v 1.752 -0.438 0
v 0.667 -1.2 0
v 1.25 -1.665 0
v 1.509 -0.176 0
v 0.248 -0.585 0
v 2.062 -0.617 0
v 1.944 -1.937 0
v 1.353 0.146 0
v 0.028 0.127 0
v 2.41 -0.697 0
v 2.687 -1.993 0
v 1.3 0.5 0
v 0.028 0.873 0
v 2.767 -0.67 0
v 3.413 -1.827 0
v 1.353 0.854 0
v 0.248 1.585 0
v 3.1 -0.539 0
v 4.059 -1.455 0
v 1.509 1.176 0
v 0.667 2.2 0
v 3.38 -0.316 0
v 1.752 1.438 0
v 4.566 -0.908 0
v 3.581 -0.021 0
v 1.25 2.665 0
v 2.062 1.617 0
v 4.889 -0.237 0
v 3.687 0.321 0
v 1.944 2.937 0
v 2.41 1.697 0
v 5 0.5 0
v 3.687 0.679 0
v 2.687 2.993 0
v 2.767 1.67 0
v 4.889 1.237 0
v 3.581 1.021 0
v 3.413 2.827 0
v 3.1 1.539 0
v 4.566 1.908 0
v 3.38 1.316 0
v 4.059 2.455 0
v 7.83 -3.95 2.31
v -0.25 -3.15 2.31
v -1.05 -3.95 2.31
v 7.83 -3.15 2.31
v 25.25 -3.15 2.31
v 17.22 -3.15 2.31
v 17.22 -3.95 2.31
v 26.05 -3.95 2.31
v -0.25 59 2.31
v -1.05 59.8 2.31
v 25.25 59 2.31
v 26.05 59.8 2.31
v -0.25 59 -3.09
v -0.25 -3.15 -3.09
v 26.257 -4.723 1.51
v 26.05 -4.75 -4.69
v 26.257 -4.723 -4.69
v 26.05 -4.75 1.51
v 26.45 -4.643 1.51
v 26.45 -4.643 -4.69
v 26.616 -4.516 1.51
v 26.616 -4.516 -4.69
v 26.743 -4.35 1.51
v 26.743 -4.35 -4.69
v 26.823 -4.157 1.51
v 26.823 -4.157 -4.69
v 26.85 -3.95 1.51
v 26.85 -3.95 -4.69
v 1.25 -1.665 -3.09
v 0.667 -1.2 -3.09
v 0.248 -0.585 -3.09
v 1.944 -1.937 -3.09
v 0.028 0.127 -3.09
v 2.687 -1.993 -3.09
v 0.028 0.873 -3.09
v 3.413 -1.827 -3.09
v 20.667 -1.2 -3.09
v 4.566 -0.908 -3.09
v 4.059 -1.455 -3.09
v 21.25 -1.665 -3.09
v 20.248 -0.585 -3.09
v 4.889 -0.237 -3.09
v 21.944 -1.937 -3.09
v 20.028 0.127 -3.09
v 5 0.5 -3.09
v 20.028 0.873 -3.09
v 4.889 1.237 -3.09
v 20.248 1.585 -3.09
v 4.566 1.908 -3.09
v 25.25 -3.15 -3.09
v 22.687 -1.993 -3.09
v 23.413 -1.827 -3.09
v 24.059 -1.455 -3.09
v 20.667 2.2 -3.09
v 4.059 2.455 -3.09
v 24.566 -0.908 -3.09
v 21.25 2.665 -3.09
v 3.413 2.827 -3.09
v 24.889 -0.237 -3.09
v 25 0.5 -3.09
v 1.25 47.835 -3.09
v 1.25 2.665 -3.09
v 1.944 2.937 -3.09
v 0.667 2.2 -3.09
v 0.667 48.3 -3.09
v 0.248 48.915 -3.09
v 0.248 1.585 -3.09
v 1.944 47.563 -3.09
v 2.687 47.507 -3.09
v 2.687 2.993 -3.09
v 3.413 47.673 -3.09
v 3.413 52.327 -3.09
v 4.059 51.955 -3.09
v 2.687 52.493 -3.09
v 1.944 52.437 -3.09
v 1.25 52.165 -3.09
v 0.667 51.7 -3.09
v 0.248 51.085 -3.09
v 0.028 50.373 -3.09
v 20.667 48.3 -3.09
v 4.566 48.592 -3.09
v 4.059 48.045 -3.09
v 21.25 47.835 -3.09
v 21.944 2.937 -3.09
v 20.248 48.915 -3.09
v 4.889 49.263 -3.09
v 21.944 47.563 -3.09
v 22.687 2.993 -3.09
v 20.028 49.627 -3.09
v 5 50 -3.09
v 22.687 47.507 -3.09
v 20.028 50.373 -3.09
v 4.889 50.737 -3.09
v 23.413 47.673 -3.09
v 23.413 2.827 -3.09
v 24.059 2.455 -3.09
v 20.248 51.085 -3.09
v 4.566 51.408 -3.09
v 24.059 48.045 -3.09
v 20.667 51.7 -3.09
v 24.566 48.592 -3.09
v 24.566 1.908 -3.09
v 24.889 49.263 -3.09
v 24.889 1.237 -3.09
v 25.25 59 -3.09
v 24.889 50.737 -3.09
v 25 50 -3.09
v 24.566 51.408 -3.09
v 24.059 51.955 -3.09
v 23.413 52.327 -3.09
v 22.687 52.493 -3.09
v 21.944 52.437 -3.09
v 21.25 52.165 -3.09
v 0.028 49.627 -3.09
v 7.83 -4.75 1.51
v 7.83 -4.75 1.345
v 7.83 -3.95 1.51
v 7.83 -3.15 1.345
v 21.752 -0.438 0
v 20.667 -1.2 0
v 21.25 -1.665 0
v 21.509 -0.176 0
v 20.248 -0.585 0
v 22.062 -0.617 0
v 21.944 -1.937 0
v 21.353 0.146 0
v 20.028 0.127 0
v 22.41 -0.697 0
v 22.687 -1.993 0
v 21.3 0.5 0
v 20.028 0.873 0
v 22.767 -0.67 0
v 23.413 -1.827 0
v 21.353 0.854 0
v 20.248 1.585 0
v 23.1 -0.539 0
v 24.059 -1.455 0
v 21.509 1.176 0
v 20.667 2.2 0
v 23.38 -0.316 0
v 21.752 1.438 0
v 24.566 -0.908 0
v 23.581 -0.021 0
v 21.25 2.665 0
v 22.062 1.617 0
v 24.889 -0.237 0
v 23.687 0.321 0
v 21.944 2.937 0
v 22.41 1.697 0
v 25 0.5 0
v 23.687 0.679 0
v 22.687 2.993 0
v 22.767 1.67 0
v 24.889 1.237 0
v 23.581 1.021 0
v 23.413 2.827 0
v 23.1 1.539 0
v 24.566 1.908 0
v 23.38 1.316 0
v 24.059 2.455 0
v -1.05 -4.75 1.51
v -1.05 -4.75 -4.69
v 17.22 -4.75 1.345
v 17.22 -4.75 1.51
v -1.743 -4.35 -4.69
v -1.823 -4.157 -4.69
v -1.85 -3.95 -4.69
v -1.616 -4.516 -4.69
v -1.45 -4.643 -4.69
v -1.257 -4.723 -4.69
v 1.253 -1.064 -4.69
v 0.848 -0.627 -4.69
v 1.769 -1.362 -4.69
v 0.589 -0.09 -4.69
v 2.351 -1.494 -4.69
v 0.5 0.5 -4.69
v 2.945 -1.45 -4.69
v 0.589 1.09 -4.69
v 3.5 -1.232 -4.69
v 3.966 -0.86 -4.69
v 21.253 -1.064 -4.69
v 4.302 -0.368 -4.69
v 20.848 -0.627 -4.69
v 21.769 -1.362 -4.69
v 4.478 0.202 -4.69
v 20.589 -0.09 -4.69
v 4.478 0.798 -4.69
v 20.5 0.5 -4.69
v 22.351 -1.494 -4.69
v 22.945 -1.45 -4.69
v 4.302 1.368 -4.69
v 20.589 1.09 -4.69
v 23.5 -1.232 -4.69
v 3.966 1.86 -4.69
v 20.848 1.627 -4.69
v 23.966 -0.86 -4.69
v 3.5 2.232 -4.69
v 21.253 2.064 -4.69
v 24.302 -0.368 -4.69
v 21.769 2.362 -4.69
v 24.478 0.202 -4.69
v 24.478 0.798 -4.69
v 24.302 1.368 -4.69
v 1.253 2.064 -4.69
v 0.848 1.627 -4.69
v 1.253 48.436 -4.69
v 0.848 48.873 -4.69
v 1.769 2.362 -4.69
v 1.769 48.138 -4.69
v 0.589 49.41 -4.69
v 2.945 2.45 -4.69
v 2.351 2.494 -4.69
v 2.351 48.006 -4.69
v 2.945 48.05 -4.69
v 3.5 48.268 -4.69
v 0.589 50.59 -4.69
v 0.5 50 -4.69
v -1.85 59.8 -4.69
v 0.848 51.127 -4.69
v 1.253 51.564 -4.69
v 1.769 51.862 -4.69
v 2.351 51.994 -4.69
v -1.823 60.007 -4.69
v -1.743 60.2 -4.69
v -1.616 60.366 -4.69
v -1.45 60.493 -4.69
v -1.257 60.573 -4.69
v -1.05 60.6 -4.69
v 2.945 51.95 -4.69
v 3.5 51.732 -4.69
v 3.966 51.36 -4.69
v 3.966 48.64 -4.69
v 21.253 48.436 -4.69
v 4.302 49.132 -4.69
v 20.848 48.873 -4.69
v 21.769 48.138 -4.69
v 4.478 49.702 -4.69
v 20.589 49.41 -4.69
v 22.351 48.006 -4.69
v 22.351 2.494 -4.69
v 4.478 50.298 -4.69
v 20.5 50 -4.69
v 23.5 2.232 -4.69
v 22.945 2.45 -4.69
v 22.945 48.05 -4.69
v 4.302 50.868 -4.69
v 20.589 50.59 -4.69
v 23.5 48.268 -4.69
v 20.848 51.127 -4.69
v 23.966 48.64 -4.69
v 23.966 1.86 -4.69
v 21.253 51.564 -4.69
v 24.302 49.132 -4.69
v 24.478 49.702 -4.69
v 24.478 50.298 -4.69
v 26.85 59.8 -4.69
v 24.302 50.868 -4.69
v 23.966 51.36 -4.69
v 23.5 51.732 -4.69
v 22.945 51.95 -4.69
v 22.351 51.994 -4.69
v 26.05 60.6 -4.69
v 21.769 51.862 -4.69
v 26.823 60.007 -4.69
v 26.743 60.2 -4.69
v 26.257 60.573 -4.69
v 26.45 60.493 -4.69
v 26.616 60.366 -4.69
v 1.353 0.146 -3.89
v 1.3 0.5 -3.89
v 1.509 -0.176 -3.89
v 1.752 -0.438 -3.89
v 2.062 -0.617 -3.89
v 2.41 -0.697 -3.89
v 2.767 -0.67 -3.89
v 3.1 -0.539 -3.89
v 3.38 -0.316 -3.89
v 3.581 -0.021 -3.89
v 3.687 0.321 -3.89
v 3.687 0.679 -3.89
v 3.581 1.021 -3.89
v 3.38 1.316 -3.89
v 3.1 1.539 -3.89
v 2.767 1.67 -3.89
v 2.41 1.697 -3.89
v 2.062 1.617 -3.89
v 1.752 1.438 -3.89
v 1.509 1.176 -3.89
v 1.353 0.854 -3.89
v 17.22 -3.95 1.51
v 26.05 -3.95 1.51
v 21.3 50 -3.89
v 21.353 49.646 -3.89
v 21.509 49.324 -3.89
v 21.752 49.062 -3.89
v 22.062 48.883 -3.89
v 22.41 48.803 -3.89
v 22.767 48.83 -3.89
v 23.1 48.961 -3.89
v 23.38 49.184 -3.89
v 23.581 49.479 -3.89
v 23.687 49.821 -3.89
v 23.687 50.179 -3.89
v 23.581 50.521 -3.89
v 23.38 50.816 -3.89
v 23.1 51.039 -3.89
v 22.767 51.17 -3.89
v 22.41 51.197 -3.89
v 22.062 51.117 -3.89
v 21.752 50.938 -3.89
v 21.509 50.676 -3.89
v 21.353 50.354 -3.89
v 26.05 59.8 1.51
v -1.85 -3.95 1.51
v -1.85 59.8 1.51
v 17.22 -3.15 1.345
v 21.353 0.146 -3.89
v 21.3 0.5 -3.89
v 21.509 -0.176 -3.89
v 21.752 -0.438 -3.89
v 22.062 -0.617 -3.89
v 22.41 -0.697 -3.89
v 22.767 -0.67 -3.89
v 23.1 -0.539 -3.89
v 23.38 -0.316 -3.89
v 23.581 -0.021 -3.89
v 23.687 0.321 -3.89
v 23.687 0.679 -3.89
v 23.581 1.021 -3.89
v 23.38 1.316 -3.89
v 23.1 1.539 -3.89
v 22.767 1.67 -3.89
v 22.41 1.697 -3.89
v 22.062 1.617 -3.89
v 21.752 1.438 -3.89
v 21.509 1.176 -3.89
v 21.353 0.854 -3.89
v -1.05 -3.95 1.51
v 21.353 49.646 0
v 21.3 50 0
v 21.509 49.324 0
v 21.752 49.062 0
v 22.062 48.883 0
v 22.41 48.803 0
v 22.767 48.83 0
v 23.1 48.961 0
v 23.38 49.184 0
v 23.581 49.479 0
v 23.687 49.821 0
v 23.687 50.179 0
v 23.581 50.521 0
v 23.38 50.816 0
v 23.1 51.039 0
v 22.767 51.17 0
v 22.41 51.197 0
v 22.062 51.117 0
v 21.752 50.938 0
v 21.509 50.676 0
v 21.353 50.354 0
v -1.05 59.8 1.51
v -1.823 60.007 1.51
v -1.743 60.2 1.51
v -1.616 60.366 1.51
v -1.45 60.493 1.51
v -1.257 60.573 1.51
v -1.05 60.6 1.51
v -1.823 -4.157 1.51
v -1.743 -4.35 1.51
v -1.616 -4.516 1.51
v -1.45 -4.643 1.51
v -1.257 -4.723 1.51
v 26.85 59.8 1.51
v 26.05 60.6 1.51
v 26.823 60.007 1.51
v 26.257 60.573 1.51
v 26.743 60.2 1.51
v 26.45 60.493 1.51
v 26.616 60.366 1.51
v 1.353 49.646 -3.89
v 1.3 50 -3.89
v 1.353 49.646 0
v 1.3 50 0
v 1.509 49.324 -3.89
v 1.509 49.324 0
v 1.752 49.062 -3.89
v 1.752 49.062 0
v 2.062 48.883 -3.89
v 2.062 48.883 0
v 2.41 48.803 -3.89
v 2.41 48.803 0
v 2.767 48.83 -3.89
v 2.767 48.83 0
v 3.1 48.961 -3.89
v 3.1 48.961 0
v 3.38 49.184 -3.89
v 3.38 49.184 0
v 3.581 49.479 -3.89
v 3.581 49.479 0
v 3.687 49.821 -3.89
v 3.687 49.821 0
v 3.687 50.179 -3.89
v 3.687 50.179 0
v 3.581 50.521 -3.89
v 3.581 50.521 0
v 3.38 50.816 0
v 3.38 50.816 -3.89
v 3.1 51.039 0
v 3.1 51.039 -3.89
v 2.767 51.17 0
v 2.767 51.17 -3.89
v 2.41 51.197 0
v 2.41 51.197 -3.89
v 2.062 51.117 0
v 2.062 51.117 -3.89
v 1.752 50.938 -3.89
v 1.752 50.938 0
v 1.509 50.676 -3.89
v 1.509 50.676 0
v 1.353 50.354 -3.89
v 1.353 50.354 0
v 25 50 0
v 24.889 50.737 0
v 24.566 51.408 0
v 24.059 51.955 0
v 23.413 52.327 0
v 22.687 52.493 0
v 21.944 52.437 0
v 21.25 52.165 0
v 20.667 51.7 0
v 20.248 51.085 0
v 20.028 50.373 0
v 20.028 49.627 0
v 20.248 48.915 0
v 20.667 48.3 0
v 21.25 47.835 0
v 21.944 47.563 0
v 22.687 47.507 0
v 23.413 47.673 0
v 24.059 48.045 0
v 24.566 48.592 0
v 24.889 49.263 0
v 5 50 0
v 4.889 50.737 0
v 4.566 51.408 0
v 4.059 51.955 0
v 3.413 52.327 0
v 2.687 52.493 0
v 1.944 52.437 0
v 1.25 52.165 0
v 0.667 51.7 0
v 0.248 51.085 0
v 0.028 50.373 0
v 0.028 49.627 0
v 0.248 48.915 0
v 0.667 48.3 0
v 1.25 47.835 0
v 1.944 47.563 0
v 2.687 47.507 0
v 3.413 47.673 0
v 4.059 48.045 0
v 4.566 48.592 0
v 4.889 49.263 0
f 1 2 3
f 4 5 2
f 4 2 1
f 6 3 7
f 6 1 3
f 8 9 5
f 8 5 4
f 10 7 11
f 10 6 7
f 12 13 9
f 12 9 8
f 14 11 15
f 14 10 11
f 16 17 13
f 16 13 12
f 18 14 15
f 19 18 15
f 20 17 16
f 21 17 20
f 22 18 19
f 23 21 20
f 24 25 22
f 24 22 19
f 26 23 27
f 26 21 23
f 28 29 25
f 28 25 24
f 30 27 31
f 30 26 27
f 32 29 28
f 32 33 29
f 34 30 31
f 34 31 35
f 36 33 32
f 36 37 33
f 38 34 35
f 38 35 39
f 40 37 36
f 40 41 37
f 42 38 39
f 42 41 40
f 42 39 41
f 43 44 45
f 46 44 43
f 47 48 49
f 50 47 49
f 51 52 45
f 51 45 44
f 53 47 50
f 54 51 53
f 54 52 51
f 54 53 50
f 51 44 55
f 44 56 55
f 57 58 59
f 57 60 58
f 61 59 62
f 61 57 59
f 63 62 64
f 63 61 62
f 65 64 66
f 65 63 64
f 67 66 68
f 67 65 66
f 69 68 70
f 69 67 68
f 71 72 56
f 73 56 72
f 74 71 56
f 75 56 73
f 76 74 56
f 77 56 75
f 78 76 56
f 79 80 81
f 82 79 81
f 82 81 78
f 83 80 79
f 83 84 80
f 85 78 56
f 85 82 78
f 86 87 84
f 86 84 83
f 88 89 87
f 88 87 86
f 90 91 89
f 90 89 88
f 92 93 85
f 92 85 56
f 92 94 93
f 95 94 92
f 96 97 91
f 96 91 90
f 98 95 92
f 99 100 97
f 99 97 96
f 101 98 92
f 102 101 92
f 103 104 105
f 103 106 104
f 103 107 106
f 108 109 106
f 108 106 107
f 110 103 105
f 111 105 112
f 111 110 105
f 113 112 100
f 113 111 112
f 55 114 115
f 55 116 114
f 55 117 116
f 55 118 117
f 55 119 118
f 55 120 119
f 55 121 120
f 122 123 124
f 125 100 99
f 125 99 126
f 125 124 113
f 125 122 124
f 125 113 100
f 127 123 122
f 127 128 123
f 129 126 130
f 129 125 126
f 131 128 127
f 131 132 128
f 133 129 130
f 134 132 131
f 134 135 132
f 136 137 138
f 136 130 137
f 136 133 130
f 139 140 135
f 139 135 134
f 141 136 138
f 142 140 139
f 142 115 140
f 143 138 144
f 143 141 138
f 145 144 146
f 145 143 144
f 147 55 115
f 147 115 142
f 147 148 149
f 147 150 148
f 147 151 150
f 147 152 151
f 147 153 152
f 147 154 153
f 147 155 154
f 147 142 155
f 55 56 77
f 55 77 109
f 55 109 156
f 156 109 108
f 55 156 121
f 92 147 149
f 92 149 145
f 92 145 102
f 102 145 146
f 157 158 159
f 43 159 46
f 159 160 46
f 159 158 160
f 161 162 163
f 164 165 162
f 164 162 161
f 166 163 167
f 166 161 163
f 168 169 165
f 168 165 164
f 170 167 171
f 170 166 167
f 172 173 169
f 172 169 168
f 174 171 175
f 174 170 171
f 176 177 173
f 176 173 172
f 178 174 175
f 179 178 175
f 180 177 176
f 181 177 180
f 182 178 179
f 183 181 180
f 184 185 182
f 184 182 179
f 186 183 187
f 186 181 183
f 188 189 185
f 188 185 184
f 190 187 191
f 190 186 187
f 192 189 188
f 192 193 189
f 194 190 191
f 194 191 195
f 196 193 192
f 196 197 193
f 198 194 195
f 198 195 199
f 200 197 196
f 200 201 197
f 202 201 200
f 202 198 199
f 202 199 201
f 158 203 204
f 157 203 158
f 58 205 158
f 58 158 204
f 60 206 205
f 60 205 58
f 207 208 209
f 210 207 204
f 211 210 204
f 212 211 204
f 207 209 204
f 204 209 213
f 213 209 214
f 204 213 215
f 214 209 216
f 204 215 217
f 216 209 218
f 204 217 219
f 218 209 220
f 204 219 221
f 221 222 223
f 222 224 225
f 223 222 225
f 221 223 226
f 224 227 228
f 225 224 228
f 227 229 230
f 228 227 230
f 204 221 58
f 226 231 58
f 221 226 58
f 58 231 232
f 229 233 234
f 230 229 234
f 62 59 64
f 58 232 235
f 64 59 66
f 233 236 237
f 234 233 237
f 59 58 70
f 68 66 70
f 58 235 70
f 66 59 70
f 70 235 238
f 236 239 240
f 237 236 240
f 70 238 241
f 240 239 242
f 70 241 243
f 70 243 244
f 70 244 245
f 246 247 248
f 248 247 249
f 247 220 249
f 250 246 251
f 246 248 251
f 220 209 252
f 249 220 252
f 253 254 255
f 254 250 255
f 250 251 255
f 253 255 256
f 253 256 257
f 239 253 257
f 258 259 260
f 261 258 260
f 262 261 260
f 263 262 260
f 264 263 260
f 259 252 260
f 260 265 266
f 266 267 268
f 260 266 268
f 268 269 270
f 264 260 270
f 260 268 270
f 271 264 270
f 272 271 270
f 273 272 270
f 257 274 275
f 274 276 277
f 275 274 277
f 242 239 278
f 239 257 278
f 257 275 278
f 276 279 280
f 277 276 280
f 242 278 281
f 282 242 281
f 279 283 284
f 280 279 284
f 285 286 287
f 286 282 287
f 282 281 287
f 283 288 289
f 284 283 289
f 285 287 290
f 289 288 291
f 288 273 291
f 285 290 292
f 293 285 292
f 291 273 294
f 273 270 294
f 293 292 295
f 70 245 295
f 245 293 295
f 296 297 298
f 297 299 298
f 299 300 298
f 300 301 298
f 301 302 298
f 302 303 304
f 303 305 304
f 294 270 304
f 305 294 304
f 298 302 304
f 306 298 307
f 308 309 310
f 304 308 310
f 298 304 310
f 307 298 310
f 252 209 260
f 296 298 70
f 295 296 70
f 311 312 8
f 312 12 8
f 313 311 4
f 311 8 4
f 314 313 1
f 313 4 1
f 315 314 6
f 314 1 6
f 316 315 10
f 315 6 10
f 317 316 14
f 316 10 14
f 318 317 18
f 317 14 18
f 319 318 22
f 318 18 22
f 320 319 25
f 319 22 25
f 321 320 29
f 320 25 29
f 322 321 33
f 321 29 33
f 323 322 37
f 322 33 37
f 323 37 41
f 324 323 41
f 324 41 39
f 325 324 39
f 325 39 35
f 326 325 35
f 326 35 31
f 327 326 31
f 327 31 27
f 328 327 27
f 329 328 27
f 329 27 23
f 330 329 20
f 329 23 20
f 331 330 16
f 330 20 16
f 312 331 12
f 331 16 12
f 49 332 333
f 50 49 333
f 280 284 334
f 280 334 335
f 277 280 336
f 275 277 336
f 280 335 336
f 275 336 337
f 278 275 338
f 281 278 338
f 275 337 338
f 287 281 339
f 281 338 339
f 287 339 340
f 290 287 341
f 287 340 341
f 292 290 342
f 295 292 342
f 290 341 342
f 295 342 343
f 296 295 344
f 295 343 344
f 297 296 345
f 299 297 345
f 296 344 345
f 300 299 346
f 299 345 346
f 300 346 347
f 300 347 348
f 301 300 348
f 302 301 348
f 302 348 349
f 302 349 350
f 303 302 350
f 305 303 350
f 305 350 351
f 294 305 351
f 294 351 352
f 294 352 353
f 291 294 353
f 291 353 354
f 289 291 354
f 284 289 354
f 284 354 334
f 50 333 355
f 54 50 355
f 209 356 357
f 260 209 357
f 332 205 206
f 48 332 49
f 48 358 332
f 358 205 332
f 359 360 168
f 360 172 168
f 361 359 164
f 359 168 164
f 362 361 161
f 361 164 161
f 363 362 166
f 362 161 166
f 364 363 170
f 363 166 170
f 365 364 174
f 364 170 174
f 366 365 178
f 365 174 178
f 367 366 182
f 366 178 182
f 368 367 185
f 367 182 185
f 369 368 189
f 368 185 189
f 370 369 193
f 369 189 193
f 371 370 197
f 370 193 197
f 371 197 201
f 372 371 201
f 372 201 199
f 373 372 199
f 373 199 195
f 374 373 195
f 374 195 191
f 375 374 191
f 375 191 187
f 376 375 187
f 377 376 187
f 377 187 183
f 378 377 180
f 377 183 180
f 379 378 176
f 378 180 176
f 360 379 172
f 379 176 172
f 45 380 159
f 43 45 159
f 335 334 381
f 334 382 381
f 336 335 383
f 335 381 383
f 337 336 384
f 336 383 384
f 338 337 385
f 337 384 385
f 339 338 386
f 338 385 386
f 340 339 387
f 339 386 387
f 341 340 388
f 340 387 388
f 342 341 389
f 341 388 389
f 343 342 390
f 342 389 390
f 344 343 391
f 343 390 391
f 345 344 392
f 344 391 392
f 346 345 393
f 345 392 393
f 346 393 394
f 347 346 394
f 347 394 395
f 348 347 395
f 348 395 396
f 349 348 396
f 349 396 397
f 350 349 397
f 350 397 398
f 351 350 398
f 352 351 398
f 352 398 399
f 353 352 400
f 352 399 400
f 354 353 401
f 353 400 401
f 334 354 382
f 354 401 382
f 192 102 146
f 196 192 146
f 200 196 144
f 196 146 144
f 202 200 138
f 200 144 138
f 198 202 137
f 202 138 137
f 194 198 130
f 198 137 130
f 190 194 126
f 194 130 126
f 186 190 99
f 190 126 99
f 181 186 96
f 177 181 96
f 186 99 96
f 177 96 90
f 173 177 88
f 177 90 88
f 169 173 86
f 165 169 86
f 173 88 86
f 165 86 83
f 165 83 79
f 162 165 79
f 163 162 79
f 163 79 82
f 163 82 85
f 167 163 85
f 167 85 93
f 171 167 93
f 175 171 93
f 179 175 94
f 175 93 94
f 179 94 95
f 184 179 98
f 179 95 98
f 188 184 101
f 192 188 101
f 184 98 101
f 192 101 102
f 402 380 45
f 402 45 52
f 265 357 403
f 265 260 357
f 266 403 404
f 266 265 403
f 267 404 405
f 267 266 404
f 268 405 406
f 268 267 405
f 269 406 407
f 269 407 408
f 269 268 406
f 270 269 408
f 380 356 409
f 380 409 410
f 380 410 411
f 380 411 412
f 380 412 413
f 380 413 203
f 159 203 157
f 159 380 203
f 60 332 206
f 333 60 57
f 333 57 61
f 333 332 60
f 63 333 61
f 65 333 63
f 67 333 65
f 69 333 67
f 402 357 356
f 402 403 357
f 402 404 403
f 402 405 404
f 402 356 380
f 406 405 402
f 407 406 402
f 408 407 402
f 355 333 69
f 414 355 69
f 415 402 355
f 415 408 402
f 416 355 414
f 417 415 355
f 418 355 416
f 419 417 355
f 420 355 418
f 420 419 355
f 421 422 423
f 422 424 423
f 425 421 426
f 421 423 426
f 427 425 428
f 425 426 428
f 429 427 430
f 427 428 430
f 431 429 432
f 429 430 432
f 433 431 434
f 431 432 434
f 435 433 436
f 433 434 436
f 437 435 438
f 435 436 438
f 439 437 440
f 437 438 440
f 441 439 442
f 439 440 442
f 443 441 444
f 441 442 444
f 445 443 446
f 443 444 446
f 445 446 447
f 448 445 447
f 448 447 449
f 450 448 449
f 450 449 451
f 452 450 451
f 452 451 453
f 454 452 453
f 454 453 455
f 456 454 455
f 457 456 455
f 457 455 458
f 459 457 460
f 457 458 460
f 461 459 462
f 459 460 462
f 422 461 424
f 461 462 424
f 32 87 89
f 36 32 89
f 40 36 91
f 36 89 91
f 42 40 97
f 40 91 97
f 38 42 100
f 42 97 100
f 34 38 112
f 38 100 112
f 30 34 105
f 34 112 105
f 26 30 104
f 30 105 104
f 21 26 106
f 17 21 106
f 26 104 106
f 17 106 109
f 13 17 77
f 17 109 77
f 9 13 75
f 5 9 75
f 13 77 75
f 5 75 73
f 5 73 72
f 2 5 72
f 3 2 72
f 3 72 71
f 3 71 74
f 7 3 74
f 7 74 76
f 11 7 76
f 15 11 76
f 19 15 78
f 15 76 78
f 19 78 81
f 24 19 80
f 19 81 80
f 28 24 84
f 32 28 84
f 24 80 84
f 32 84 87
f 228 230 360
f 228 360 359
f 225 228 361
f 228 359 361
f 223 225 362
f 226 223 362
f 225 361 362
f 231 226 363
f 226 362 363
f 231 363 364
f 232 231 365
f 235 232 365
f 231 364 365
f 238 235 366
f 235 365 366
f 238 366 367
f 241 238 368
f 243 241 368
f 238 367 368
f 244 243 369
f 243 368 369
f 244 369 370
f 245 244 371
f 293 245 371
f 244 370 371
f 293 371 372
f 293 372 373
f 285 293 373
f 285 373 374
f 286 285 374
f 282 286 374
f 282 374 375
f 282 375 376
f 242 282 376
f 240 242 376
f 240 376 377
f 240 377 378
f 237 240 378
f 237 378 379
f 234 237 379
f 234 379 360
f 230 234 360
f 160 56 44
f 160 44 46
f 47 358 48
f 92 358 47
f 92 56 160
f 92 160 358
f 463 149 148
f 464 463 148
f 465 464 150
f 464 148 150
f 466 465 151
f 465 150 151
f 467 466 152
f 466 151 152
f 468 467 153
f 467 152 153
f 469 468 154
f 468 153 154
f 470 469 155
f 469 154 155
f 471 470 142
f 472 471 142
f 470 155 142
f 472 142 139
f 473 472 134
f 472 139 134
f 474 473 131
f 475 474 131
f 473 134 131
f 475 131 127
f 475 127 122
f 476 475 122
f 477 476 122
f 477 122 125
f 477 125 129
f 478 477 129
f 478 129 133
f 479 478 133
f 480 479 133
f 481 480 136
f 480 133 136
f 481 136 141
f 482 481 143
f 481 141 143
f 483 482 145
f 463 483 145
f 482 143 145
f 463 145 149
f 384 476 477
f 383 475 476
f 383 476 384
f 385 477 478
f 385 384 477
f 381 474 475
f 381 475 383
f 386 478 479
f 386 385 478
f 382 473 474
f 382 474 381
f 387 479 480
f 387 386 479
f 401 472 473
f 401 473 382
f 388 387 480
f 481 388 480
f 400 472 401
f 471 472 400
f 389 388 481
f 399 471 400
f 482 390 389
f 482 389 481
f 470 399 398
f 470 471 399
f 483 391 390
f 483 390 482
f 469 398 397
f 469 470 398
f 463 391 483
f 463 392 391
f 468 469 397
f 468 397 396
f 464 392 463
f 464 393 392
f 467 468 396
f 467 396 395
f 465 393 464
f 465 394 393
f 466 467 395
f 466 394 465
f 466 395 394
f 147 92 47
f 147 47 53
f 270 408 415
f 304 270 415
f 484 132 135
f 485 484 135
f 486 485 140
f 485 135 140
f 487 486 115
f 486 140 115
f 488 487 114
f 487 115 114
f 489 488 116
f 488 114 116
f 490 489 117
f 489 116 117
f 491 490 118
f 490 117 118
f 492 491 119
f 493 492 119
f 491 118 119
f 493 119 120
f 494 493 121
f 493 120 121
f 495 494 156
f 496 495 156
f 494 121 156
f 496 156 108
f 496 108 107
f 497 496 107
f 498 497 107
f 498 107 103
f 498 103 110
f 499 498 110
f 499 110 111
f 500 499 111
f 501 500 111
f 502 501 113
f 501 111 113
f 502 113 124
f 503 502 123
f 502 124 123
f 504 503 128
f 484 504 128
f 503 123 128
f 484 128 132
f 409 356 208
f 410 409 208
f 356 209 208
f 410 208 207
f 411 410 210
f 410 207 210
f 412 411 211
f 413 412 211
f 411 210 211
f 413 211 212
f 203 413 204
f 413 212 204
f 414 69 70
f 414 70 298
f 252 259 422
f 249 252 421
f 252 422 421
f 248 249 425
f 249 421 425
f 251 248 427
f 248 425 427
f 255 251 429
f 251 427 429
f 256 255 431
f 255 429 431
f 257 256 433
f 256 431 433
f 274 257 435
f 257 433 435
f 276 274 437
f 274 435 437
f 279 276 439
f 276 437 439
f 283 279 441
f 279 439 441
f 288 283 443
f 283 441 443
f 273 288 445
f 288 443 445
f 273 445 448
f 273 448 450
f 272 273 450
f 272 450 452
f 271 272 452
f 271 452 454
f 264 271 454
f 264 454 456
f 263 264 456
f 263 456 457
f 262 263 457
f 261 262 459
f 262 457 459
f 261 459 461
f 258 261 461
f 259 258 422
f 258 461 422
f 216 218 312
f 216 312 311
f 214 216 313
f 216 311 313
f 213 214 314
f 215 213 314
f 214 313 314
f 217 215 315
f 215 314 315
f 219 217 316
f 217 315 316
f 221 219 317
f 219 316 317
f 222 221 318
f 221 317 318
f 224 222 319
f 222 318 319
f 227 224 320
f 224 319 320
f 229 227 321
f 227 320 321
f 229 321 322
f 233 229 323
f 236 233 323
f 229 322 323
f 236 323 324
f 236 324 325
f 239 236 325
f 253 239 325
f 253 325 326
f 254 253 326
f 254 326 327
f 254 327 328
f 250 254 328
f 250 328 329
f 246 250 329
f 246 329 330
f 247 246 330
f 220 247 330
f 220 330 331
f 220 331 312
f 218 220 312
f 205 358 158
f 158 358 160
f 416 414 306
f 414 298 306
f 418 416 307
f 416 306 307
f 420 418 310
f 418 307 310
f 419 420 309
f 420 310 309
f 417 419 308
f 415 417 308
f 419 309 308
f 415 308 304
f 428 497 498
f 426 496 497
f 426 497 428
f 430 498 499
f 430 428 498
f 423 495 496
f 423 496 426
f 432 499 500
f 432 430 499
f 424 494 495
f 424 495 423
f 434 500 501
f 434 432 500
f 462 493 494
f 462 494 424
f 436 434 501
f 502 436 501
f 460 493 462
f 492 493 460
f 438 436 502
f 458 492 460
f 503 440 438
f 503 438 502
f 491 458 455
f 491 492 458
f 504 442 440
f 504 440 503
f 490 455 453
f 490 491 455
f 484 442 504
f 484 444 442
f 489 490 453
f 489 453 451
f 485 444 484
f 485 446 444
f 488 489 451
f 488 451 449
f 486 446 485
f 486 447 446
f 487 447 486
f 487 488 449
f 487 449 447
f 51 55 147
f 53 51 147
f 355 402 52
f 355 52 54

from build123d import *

# Parameters (mm, degrees)
SKETCH_W         = 25.5
SKETCH_H         = 62.15
PAD_DEPTH        = 4.6
THICKNESS_T      = 1.6
SKETCH001_R      = 2.5
PAD001_DEPTH     = 3.09
SKETCH002_R      = 1.6
POCKET_DEPTH     = 3
FILLET_R         = 0.8
SKETCH003_W      = 27.1
SKETCH003_H      = 63.75
SKETCH003_W_2    = 25.5
SKETCH003_H_2    = 62.15
PAD002_DEPTH     = 0.8
SKETCH004_W      = 9.39
SKETCH004_H      = 0.965
POCKET001_DEPTH  = 5
SKETCH005_R      = 2.5
PAD003_DEPTH     = 3.09
HOLE_D           = 2.4
HOLE_DEPTH       = 25
HOLE_CSINK_D     = 4
HOLE_CSINK_ANGLE = 90


with BuildPart() as part:
    # Sketch (on Face4132 of Binder) → Pad (new body)
    with BuildSketch(Plane.XY.offset(1.51)):
        with Locations((12.5, 27.925)):
            Rectangle(SKETCH_W, SKETCH_H)
    extrude(amount=-PAD_DEPTH)

    # Thickness
    thickness_openings = [part.faces().sort_by_distance(p)[0] for p in [
        (12.5, 27.925, 1.51),
    ]]
    offset(amount=THICKNESS_T, openings=thickness_openings, kind=Kind.INTERSECTION)

    # Sketch001 (on Face5 of Thickness) → Pad001 (join)
    with BuildSketch(Plane.XY.offset(-3.09)):
        with Locations((2.5, 0.5)):
            Circle(SKETCH001_R)
        with Locations((22.5, 0.5)):
            Circle(SKETCH001_R)
        with Locations((2.5, 50)):
            Circle(SKETCH001_R)
        with Locations((22.5, 50)):
            Circle(SKETCH001_R)
    extrude(amount=PAD001_DEPTH)

    # Sketch002 (on Face18 of Pad001) → Pocket (cut)
    with BuildSketch(Plane.XY):
        with Locations((2.5, 50)):
            Circle(SKETCH002_R)
        with Locations((22.5, 50)):
            Circle(SKETCH002_R)
        with Locations((2.5, 0.5)):
            Circle(SKETCH002_R)
        with Locations((22.5, 0.5)):
            Circle(SKETCH002_R)
    extrude(amount=-POCKET_DEPTH, mode=Mode.SUBTRACT)

    # Fillet
    fillet_edges = [part.edges().sort_by_distance(p)[0] for p in [
        (-1.85, -4.75, -1.59),
        (26.85, -4.75, -1.59),
        (-1.85, 60.6, -1.59),
        (26.85, 60.6, -1.59),
    ]]
    fillet(fillet_edges, radius=FILLET_R)

    # Sketch003 (on Face1 of Fillet) → Pad002 (join)
    with BuildSketch(Plane.XY.offset(1.51)):
        with Locations((12.5, 27.925)):
            Rectangle(SKETCH003_W, SKETCH003_H)
        with Locations((12.5, 27.925)):
            Rectangle(SKETCH003_W_2, SKETCH003_H_2, mode=Mode.SUBTRACT)
    extrude(amount=PAD002_DEPTH)

    # Sketch004 (on Face17 of Pad002) → Pocket001 (cut)
    with BuildSketch(Plane(origin=(0, -3.15, 0), x_dir=(-1, 0, 0), z_dir=(0, 1, 0))):
        with Locations((-12.525, 1.8275)):
            Rectangle(SKETCH004_W, SKETCH004_H)
    extrude(amount=-POCKET001_DEPTH, mode=Mode.SUBTRACT)

    # Sketch005 (on Face25 of Pocket001) → Pad003 (join)
    with BuildSketch(Plane.XY.offset(-3.09)):
        with Locations((2.5, 50)):
            Circle(SKETCH005_R)
        with Locations((22.5, 50)):
            Circle(SKETCH005_R)
        with Locations((2.5, 0.5)):
            Circle(SKETCH005_R)
        with Locations((22.5, 0.5)):
            Circle(SKETCH005_R)
    extrude(amount=PAD003_DEPTH)

    # Hole
    with Locations(Plane(origin=(0, 0, -4.69), x_dir=(1, 0, 0), z_dir=(0, 0, -1))):
        with Locations((2.5, -0.5), (22.5, -0.5), (2.5, -50), (22.5, -50)):
            CounterSinkHole(HOLE_D / 2, HOLE_CSINK_D / 2, depth=HOLE_DEPTH, counter_sink_angle=HOLE_CSINK_ANGLE)


solid = part.part
